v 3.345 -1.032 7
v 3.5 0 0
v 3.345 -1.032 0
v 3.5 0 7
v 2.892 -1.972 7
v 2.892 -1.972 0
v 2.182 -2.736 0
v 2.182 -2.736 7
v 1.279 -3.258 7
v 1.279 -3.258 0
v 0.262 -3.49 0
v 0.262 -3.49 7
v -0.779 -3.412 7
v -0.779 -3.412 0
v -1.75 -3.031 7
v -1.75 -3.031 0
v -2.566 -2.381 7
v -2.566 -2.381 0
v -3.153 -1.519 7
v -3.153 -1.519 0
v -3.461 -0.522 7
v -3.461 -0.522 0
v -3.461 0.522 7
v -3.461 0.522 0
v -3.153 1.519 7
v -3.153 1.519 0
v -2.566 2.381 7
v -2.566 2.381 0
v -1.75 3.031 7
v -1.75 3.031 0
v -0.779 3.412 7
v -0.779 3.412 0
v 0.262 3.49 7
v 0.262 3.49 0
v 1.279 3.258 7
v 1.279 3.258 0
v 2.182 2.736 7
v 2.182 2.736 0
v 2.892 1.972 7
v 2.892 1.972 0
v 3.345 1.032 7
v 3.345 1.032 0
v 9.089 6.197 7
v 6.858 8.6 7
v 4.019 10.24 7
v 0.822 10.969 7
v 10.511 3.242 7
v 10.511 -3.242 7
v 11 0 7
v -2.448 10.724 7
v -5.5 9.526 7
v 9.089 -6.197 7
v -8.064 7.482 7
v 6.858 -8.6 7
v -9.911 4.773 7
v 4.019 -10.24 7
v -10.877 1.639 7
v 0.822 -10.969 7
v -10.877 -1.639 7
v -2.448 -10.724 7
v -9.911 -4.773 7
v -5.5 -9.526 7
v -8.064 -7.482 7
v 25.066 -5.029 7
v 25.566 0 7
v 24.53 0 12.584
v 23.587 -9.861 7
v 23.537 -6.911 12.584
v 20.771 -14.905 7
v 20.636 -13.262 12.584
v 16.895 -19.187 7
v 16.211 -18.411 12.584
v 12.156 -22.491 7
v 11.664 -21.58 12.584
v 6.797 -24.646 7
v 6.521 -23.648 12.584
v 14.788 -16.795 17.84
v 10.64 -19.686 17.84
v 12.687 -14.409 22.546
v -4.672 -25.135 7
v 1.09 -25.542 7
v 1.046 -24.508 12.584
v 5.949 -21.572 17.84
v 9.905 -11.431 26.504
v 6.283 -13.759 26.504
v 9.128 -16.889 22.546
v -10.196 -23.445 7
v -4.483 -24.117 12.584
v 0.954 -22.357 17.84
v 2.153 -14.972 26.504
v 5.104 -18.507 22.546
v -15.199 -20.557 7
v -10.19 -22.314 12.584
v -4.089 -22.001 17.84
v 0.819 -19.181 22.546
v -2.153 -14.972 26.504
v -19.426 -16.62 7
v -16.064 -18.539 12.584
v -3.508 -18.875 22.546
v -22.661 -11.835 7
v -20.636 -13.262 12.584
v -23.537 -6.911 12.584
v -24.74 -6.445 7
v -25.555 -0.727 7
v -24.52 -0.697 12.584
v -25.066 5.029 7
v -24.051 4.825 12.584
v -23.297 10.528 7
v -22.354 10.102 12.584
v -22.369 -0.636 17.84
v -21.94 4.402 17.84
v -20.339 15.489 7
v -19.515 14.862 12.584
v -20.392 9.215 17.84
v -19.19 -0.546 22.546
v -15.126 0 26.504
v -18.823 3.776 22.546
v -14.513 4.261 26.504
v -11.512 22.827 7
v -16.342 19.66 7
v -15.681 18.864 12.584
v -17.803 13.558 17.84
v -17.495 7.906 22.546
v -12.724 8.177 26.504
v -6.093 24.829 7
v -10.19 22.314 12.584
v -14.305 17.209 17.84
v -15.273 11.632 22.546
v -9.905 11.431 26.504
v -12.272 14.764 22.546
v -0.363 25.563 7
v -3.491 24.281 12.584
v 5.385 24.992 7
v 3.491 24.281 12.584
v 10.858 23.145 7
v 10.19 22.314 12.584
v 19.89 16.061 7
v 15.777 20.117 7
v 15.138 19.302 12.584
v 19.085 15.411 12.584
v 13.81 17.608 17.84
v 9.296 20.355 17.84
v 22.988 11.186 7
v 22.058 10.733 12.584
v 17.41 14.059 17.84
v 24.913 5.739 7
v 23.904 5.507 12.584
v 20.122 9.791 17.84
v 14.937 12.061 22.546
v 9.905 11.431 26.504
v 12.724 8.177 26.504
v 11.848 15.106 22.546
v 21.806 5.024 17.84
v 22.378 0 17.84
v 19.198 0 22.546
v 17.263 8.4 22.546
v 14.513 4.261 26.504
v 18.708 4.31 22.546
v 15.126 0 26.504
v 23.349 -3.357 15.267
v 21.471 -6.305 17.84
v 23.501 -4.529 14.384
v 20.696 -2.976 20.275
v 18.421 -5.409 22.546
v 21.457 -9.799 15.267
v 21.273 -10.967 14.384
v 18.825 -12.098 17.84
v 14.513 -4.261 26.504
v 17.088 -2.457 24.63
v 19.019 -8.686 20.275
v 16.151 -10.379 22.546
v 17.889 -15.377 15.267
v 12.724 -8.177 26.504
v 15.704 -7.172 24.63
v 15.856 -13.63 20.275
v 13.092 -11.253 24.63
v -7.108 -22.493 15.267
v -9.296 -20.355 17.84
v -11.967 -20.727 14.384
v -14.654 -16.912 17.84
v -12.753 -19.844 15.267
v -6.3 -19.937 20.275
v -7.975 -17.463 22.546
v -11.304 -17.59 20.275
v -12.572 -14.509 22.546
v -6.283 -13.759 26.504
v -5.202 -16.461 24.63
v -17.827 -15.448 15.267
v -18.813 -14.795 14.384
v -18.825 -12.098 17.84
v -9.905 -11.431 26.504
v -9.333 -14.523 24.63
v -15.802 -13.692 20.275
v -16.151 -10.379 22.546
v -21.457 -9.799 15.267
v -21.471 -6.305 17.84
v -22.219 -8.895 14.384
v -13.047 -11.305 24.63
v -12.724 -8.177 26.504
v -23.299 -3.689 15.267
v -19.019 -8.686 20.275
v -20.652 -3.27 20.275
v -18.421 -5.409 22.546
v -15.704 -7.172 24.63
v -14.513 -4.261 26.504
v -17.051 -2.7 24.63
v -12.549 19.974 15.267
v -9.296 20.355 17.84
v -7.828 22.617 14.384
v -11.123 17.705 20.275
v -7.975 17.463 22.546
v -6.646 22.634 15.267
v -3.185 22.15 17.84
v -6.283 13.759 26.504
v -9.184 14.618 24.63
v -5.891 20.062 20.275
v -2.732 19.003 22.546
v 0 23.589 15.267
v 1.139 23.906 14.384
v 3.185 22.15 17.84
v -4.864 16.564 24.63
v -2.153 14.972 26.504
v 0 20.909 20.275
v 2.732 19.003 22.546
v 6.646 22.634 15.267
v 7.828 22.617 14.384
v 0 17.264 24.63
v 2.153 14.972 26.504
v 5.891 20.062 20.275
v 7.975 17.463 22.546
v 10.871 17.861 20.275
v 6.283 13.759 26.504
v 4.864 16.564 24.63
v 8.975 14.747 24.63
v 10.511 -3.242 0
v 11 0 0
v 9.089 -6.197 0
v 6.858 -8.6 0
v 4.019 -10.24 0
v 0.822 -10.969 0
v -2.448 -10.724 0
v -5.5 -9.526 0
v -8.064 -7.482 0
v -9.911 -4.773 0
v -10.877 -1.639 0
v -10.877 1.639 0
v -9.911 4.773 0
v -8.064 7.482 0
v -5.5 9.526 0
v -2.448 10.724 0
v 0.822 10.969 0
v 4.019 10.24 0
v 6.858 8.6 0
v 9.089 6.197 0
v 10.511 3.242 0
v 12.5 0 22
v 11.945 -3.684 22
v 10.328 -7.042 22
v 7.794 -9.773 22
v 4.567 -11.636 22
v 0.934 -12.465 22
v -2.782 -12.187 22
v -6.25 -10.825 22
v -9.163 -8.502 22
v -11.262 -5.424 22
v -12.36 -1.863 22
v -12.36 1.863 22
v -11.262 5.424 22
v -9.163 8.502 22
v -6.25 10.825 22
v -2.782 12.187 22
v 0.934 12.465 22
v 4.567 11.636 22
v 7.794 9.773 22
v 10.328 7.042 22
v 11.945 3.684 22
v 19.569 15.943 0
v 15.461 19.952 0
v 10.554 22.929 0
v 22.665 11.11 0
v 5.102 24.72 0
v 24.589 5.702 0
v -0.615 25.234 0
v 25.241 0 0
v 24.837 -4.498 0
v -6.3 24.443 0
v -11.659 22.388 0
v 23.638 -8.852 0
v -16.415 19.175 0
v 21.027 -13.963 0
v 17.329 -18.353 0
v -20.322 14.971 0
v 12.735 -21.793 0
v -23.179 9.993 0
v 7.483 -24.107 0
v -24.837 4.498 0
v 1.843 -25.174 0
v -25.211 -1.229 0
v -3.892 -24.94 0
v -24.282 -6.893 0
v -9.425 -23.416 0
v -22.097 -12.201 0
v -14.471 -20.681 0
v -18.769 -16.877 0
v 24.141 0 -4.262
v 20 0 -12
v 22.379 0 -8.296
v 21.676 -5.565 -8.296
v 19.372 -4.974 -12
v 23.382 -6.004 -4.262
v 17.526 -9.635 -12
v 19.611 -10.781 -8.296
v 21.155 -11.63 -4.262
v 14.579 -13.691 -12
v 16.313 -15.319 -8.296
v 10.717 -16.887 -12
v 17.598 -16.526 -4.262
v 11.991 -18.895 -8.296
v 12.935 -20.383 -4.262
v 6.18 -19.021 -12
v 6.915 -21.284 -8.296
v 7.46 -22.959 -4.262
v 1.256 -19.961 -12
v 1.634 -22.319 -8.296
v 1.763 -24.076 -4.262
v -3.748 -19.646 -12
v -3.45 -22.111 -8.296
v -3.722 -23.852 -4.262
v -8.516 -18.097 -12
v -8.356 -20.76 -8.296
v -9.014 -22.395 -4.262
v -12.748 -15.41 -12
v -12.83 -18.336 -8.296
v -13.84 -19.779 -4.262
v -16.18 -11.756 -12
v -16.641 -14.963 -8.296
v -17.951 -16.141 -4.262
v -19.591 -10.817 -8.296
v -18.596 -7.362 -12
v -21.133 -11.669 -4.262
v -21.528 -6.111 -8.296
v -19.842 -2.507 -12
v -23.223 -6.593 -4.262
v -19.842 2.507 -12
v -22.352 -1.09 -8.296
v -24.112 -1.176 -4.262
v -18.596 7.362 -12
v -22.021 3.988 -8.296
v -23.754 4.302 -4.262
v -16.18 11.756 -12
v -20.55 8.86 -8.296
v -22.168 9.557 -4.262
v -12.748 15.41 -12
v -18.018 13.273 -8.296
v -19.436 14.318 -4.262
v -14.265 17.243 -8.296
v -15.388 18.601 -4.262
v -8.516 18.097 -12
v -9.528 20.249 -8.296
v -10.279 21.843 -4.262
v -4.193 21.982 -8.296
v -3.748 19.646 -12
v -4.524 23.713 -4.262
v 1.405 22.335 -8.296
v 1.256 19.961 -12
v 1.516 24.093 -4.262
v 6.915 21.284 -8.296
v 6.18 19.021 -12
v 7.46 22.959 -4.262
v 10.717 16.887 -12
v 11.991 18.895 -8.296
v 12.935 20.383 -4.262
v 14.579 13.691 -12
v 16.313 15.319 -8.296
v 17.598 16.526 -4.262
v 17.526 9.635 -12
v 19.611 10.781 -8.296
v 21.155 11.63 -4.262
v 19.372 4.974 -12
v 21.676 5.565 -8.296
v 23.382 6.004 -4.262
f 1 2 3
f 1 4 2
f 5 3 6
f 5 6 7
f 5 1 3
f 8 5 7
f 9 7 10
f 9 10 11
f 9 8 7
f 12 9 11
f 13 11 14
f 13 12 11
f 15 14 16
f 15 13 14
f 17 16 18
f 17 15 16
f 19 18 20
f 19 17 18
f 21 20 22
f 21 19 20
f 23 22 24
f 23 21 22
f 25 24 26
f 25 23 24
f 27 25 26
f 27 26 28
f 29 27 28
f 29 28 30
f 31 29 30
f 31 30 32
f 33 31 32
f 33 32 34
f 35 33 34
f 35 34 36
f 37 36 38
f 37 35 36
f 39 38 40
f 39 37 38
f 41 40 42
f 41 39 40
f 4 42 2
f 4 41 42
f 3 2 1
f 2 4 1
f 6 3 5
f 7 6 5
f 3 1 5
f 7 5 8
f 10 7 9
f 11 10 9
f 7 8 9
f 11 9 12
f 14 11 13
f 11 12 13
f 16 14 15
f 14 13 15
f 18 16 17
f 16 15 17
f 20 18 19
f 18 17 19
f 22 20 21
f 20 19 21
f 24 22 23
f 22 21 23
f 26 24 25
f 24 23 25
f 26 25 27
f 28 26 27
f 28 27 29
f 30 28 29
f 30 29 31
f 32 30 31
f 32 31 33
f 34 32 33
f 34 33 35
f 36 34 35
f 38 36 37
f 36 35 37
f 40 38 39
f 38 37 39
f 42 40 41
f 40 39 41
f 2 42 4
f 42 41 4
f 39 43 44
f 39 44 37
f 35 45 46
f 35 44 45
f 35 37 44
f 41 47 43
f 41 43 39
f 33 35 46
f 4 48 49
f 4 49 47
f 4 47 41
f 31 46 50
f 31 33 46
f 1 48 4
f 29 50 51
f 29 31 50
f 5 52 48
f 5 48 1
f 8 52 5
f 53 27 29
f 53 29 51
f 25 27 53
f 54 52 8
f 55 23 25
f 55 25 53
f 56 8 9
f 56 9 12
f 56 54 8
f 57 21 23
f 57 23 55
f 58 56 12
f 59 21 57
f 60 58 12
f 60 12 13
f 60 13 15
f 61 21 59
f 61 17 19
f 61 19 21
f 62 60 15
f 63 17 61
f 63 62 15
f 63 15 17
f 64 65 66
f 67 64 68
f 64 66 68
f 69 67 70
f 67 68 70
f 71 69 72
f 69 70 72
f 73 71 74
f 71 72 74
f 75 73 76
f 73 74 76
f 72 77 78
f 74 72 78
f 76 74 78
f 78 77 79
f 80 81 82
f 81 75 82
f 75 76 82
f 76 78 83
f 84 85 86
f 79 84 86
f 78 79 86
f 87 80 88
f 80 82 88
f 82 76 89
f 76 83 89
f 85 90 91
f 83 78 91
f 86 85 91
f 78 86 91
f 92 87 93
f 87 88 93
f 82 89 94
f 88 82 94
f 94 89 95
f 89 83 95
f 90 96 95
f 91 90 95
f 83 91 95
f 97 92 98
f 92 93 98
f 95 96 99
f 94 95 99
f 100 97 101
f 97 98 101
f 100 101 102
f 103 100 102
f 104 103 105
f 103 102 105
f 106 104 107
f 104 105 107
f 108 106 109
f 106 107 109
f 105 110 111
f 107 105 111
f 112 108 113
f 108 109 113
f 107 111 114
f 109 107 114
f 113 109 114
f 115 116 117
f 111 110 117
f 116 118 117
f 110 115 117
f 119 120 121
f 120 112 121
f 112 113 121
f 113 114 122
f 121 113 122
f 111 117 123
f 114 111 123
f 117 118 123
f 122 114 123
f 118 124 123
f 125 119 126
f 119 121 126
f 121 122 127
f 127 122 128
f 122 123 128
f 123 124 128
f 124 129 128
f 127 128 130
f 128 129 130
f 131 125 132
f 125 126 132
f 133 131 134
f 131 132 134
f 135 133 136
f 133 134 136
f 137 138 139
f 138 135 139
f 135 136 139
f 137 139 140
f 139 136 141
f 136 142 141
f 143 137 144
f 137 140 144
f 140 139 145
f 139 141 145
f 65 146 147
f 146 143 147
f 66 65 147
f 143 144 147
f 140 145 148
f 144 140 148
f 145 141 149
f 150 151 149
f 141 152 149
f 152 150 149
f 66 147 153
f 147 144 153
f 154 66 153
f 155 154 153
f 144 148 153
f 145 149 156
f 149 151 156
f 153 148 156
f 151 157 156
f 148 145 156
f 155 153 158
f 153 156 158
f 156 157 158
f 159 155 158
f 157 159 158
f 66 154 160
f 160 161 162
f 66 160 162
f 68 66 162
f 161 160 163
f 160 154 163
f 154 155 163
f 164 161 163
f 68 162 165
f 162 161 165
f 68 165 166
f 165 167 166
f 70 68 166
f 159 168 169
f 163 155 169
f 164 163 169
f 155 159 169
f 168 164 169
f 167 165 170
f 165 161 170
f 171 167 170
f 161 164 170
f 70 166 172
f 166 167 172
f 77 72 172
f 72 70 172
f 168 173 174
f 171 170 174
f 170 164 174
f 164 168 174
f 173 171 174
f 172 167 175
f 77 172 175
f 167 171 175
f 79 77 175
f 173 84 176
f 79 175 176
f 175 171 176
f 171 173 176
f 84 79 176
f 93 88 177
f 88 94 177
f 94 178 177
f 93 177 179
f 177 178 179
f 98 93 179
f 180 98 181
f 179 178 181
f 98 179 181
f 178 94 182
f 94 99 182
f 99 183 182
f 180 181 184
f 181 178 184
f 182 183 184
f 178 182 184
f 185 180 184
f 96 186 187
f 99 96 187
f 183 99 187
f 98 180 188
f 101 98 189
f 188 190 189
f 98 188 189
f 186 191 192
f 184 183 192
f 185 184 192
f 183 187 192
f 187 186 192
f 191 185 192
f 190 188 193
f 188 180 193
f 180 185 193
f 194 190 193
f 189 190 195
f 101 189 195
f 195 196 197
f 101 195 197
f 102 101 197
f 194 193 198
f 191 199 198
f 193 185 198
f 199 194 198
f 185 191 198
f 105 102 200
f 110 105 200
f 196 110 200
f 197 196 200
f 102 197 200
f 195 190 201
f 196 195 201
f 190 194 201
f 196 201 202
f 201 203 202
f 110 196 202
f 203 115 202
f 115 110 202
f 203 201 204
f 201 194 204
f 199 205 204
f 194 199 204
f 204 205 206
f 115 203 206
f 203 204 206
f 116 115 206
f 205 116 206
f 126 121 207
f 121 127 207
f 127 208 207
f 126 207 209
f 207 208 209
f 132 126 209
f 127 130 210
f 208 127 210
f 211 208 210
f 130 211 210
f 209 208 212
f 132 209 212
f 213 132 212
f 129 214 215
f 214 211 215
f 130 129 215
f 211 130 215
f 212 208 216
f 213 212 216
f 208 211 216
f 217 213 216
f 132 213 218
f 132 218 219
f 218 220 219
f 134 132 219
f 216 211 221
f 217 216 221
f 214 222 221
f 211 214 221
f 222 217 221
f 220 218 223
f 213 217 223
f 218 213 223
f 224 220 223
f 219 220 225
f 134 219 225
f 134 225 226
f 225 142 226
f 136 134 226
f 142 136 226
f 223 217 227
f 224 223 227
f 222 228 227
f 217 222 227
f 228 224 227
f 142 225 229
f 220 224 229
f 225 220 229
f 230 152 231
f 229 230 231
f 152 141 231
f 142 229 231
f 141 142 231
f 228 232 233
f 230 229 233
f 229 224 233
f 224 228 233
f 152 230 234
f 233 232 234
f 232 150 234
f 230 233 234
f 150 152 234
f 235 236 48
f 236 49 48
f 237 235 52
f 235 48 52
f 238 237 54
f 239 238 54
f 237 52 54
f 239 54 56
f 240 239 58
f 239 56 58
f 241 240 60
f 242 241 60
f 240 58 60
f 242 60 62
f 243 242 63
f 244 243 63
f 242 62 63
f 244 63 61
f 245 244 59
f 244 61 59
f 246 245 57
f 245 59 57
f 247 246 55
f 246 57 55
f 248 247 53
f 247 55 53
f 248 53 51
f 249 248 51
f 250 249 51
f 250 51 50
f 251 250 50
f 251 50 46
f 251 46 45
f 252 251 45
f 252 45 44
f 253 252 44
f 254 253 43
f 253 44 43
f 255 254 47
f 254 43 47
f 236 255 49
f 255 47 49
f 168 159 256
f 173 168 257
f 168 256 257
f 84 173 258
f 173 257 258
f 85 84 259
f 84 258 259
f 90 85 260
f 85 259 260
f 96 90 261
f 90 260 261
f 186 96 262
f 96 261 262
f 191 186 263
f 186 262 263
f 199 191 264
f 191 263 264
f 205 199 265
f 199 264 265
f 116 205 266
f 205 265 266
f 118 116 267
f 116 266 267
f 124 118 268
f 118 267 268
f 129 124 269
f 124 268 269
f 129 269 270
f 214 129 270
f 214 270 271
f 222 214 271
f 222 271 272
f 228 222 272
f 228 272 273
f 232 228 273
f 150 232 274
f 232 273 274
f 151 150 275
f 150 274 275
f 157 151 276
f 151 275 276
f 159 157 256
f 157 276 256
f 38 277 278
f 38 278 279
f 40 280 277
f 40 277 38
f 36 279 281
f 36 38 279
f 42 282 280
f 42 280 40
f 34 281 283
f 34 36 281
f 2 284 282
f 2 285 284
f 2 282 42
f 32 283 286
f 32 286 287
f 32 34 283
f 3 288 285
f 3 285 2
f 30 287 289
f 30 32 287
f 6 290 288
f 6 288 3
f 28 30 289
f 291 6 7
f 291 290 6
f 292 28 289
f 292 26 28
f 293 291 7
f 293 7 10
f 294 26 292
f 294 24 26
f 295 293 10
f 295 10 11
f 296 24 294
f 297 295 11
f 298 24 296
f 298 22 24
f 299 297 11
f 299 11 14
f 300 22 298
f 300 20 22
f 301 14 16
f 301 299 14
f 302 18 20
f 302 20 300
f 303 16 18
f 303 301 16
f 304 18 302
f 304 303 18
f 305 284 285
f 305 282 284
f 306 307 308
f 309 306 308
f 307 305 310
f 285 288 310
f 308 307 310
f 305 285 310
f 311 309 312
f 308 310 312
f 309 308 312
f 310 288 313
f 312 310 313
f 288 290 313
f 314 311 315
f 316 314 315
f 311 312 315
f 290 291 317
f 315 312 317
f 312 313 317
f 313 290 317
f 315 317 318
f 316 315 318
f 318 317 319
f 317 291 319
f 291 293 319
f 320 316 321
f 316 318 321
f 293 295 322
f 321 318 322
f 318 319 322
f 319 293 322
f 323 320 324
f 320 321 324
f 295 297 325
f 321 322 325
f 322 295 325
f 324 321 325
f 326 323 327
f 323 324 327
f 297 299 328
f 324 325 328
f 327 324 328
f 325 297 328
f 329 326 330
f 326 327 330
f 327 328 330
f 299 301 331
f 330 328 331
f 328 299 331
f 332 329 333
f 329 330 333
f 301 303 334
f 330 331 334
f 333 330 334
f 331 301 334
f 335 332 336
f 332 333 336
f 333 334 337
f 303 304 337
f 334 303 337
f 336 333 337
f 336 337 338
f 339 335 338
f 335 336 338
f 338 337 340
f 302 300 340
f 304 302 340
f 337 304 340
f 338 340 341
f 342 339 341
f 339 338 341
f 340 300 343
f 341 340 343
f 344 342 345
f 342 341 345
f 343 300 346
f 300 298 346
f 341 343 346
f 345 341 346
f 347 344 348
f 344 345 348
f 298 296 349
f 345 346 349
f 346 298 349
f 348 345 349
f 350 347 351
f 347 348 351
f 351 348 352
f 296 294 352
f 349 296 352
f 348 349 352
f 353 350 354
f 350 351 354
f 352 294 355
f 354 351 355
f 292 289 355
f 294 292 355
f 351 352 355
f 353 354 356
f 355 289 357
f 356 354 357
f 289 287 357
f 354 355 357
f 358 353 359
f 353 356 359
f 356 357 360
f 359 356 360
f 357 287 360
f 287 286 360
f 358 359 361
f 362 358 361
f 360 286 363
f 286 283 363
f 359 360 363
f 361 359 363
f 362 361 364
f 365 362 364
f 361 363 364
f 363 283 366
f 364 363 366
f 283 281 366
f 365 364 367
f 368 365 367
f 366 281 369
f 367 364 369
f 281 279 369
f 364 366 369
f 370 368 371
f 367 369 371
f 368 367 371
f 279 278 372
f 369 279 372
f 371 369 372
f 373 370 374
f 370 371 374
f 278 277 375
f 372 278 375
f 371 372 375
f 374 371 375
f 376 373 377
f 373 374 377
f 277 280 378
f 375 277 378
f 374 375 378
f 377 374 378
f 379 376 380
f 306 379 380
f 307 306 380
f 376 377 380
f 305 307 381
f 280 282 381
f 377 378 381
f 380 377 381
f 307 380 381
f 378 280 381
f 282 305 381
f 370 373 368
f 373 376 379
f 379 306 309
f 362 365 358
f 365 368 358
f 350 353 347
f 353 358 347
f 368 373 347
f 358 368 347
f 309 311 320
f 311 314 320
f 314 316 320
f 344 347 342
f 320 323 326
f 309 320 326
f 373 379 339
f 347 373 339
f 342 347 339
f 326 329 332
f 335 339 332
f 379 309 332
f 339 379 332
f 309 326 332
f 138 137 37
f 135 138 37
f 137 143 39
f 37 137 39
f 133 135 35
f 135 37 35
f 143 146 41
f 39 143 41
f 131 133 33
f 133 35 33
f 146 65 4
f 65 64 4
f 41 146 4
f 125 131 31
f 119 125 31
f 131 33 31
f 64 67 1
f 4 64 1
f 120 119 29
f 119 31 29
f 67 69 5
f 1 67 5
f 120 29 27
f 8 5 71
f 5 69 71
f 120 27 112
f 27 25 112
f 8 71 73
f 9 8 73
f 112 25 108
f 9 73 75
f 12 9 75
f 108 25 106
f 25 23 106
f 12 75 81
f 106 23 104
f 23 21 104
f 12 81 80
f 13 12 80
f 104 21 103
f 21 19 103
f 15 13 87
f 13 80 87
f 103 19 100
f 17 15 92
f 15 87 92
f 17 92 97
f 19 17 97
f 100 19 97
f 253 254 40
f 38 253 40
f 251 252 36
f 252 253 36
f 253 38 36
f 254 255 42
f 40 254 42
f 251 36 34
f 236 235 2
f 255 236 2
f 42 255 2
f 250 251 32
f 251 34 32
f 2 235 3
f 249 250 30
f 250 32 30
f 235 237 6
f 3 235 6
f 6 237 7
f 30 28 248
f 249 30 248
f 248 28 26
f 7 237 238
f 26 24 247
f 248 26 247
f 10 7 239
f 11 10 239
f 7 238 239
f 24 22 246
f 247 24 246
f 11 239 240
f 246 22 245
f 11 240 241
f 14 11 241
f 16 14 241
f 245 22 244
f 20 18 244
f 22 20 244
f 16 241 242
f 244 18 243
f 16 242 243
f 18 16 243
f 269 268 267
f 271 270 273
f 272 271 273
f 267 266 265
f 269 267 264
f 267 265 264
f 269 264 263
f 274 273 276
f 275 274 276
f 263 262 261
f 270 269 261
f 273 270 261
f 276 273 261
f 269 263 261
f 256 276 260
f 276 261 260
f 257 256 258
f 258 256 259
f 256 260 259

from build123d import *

# Parameters (mm, degrees)
F2_W = 25.197219
F2_H = 7
F1_W = 7.5
F1_H = 7


with BuildPart() as f3:
    # F0 (on Front) → F3 (revolve)
    with BuildSketch(Plane.XZ):
        with BuildLine():
            Line((0, 22), (0, -12))
            Line((0, -12), (20, -12))
            ThreePointArc((20, -12), (25.436094, 8.248895), (15.125565, 26.504356))
            Line((15.125565, 26.504356), (12.5, 22))
            Line((12.5, 22), (0, 22))
        make_face()
    revolve(axis=Axis((0, 0, 5), (0, 0, -1)))

    # F2 (on Front) → F4 (revolve, cut)
    with BuildSketch(Plane.XZ):
        with Locations((16.09861, 3.5)):
            Rectangle(F2_W, F2_H)
    revolve(axis=Axis((0, 0, 5), (0, 0, -1)), mode=Mode.SUBTRACT)


with BuildPart() as f5:
    # F1 (on Front) → F5 (revolve)
    with BuildSketch(Plane.XZ):
        with Locations((7.25, 3.5)):
            Rectangle(F1_W, F1_H)
    revolve(axis=Axis((0, 0, 5), (0, 0, -1)))


solid = Compound([f3.part, f5.part])
